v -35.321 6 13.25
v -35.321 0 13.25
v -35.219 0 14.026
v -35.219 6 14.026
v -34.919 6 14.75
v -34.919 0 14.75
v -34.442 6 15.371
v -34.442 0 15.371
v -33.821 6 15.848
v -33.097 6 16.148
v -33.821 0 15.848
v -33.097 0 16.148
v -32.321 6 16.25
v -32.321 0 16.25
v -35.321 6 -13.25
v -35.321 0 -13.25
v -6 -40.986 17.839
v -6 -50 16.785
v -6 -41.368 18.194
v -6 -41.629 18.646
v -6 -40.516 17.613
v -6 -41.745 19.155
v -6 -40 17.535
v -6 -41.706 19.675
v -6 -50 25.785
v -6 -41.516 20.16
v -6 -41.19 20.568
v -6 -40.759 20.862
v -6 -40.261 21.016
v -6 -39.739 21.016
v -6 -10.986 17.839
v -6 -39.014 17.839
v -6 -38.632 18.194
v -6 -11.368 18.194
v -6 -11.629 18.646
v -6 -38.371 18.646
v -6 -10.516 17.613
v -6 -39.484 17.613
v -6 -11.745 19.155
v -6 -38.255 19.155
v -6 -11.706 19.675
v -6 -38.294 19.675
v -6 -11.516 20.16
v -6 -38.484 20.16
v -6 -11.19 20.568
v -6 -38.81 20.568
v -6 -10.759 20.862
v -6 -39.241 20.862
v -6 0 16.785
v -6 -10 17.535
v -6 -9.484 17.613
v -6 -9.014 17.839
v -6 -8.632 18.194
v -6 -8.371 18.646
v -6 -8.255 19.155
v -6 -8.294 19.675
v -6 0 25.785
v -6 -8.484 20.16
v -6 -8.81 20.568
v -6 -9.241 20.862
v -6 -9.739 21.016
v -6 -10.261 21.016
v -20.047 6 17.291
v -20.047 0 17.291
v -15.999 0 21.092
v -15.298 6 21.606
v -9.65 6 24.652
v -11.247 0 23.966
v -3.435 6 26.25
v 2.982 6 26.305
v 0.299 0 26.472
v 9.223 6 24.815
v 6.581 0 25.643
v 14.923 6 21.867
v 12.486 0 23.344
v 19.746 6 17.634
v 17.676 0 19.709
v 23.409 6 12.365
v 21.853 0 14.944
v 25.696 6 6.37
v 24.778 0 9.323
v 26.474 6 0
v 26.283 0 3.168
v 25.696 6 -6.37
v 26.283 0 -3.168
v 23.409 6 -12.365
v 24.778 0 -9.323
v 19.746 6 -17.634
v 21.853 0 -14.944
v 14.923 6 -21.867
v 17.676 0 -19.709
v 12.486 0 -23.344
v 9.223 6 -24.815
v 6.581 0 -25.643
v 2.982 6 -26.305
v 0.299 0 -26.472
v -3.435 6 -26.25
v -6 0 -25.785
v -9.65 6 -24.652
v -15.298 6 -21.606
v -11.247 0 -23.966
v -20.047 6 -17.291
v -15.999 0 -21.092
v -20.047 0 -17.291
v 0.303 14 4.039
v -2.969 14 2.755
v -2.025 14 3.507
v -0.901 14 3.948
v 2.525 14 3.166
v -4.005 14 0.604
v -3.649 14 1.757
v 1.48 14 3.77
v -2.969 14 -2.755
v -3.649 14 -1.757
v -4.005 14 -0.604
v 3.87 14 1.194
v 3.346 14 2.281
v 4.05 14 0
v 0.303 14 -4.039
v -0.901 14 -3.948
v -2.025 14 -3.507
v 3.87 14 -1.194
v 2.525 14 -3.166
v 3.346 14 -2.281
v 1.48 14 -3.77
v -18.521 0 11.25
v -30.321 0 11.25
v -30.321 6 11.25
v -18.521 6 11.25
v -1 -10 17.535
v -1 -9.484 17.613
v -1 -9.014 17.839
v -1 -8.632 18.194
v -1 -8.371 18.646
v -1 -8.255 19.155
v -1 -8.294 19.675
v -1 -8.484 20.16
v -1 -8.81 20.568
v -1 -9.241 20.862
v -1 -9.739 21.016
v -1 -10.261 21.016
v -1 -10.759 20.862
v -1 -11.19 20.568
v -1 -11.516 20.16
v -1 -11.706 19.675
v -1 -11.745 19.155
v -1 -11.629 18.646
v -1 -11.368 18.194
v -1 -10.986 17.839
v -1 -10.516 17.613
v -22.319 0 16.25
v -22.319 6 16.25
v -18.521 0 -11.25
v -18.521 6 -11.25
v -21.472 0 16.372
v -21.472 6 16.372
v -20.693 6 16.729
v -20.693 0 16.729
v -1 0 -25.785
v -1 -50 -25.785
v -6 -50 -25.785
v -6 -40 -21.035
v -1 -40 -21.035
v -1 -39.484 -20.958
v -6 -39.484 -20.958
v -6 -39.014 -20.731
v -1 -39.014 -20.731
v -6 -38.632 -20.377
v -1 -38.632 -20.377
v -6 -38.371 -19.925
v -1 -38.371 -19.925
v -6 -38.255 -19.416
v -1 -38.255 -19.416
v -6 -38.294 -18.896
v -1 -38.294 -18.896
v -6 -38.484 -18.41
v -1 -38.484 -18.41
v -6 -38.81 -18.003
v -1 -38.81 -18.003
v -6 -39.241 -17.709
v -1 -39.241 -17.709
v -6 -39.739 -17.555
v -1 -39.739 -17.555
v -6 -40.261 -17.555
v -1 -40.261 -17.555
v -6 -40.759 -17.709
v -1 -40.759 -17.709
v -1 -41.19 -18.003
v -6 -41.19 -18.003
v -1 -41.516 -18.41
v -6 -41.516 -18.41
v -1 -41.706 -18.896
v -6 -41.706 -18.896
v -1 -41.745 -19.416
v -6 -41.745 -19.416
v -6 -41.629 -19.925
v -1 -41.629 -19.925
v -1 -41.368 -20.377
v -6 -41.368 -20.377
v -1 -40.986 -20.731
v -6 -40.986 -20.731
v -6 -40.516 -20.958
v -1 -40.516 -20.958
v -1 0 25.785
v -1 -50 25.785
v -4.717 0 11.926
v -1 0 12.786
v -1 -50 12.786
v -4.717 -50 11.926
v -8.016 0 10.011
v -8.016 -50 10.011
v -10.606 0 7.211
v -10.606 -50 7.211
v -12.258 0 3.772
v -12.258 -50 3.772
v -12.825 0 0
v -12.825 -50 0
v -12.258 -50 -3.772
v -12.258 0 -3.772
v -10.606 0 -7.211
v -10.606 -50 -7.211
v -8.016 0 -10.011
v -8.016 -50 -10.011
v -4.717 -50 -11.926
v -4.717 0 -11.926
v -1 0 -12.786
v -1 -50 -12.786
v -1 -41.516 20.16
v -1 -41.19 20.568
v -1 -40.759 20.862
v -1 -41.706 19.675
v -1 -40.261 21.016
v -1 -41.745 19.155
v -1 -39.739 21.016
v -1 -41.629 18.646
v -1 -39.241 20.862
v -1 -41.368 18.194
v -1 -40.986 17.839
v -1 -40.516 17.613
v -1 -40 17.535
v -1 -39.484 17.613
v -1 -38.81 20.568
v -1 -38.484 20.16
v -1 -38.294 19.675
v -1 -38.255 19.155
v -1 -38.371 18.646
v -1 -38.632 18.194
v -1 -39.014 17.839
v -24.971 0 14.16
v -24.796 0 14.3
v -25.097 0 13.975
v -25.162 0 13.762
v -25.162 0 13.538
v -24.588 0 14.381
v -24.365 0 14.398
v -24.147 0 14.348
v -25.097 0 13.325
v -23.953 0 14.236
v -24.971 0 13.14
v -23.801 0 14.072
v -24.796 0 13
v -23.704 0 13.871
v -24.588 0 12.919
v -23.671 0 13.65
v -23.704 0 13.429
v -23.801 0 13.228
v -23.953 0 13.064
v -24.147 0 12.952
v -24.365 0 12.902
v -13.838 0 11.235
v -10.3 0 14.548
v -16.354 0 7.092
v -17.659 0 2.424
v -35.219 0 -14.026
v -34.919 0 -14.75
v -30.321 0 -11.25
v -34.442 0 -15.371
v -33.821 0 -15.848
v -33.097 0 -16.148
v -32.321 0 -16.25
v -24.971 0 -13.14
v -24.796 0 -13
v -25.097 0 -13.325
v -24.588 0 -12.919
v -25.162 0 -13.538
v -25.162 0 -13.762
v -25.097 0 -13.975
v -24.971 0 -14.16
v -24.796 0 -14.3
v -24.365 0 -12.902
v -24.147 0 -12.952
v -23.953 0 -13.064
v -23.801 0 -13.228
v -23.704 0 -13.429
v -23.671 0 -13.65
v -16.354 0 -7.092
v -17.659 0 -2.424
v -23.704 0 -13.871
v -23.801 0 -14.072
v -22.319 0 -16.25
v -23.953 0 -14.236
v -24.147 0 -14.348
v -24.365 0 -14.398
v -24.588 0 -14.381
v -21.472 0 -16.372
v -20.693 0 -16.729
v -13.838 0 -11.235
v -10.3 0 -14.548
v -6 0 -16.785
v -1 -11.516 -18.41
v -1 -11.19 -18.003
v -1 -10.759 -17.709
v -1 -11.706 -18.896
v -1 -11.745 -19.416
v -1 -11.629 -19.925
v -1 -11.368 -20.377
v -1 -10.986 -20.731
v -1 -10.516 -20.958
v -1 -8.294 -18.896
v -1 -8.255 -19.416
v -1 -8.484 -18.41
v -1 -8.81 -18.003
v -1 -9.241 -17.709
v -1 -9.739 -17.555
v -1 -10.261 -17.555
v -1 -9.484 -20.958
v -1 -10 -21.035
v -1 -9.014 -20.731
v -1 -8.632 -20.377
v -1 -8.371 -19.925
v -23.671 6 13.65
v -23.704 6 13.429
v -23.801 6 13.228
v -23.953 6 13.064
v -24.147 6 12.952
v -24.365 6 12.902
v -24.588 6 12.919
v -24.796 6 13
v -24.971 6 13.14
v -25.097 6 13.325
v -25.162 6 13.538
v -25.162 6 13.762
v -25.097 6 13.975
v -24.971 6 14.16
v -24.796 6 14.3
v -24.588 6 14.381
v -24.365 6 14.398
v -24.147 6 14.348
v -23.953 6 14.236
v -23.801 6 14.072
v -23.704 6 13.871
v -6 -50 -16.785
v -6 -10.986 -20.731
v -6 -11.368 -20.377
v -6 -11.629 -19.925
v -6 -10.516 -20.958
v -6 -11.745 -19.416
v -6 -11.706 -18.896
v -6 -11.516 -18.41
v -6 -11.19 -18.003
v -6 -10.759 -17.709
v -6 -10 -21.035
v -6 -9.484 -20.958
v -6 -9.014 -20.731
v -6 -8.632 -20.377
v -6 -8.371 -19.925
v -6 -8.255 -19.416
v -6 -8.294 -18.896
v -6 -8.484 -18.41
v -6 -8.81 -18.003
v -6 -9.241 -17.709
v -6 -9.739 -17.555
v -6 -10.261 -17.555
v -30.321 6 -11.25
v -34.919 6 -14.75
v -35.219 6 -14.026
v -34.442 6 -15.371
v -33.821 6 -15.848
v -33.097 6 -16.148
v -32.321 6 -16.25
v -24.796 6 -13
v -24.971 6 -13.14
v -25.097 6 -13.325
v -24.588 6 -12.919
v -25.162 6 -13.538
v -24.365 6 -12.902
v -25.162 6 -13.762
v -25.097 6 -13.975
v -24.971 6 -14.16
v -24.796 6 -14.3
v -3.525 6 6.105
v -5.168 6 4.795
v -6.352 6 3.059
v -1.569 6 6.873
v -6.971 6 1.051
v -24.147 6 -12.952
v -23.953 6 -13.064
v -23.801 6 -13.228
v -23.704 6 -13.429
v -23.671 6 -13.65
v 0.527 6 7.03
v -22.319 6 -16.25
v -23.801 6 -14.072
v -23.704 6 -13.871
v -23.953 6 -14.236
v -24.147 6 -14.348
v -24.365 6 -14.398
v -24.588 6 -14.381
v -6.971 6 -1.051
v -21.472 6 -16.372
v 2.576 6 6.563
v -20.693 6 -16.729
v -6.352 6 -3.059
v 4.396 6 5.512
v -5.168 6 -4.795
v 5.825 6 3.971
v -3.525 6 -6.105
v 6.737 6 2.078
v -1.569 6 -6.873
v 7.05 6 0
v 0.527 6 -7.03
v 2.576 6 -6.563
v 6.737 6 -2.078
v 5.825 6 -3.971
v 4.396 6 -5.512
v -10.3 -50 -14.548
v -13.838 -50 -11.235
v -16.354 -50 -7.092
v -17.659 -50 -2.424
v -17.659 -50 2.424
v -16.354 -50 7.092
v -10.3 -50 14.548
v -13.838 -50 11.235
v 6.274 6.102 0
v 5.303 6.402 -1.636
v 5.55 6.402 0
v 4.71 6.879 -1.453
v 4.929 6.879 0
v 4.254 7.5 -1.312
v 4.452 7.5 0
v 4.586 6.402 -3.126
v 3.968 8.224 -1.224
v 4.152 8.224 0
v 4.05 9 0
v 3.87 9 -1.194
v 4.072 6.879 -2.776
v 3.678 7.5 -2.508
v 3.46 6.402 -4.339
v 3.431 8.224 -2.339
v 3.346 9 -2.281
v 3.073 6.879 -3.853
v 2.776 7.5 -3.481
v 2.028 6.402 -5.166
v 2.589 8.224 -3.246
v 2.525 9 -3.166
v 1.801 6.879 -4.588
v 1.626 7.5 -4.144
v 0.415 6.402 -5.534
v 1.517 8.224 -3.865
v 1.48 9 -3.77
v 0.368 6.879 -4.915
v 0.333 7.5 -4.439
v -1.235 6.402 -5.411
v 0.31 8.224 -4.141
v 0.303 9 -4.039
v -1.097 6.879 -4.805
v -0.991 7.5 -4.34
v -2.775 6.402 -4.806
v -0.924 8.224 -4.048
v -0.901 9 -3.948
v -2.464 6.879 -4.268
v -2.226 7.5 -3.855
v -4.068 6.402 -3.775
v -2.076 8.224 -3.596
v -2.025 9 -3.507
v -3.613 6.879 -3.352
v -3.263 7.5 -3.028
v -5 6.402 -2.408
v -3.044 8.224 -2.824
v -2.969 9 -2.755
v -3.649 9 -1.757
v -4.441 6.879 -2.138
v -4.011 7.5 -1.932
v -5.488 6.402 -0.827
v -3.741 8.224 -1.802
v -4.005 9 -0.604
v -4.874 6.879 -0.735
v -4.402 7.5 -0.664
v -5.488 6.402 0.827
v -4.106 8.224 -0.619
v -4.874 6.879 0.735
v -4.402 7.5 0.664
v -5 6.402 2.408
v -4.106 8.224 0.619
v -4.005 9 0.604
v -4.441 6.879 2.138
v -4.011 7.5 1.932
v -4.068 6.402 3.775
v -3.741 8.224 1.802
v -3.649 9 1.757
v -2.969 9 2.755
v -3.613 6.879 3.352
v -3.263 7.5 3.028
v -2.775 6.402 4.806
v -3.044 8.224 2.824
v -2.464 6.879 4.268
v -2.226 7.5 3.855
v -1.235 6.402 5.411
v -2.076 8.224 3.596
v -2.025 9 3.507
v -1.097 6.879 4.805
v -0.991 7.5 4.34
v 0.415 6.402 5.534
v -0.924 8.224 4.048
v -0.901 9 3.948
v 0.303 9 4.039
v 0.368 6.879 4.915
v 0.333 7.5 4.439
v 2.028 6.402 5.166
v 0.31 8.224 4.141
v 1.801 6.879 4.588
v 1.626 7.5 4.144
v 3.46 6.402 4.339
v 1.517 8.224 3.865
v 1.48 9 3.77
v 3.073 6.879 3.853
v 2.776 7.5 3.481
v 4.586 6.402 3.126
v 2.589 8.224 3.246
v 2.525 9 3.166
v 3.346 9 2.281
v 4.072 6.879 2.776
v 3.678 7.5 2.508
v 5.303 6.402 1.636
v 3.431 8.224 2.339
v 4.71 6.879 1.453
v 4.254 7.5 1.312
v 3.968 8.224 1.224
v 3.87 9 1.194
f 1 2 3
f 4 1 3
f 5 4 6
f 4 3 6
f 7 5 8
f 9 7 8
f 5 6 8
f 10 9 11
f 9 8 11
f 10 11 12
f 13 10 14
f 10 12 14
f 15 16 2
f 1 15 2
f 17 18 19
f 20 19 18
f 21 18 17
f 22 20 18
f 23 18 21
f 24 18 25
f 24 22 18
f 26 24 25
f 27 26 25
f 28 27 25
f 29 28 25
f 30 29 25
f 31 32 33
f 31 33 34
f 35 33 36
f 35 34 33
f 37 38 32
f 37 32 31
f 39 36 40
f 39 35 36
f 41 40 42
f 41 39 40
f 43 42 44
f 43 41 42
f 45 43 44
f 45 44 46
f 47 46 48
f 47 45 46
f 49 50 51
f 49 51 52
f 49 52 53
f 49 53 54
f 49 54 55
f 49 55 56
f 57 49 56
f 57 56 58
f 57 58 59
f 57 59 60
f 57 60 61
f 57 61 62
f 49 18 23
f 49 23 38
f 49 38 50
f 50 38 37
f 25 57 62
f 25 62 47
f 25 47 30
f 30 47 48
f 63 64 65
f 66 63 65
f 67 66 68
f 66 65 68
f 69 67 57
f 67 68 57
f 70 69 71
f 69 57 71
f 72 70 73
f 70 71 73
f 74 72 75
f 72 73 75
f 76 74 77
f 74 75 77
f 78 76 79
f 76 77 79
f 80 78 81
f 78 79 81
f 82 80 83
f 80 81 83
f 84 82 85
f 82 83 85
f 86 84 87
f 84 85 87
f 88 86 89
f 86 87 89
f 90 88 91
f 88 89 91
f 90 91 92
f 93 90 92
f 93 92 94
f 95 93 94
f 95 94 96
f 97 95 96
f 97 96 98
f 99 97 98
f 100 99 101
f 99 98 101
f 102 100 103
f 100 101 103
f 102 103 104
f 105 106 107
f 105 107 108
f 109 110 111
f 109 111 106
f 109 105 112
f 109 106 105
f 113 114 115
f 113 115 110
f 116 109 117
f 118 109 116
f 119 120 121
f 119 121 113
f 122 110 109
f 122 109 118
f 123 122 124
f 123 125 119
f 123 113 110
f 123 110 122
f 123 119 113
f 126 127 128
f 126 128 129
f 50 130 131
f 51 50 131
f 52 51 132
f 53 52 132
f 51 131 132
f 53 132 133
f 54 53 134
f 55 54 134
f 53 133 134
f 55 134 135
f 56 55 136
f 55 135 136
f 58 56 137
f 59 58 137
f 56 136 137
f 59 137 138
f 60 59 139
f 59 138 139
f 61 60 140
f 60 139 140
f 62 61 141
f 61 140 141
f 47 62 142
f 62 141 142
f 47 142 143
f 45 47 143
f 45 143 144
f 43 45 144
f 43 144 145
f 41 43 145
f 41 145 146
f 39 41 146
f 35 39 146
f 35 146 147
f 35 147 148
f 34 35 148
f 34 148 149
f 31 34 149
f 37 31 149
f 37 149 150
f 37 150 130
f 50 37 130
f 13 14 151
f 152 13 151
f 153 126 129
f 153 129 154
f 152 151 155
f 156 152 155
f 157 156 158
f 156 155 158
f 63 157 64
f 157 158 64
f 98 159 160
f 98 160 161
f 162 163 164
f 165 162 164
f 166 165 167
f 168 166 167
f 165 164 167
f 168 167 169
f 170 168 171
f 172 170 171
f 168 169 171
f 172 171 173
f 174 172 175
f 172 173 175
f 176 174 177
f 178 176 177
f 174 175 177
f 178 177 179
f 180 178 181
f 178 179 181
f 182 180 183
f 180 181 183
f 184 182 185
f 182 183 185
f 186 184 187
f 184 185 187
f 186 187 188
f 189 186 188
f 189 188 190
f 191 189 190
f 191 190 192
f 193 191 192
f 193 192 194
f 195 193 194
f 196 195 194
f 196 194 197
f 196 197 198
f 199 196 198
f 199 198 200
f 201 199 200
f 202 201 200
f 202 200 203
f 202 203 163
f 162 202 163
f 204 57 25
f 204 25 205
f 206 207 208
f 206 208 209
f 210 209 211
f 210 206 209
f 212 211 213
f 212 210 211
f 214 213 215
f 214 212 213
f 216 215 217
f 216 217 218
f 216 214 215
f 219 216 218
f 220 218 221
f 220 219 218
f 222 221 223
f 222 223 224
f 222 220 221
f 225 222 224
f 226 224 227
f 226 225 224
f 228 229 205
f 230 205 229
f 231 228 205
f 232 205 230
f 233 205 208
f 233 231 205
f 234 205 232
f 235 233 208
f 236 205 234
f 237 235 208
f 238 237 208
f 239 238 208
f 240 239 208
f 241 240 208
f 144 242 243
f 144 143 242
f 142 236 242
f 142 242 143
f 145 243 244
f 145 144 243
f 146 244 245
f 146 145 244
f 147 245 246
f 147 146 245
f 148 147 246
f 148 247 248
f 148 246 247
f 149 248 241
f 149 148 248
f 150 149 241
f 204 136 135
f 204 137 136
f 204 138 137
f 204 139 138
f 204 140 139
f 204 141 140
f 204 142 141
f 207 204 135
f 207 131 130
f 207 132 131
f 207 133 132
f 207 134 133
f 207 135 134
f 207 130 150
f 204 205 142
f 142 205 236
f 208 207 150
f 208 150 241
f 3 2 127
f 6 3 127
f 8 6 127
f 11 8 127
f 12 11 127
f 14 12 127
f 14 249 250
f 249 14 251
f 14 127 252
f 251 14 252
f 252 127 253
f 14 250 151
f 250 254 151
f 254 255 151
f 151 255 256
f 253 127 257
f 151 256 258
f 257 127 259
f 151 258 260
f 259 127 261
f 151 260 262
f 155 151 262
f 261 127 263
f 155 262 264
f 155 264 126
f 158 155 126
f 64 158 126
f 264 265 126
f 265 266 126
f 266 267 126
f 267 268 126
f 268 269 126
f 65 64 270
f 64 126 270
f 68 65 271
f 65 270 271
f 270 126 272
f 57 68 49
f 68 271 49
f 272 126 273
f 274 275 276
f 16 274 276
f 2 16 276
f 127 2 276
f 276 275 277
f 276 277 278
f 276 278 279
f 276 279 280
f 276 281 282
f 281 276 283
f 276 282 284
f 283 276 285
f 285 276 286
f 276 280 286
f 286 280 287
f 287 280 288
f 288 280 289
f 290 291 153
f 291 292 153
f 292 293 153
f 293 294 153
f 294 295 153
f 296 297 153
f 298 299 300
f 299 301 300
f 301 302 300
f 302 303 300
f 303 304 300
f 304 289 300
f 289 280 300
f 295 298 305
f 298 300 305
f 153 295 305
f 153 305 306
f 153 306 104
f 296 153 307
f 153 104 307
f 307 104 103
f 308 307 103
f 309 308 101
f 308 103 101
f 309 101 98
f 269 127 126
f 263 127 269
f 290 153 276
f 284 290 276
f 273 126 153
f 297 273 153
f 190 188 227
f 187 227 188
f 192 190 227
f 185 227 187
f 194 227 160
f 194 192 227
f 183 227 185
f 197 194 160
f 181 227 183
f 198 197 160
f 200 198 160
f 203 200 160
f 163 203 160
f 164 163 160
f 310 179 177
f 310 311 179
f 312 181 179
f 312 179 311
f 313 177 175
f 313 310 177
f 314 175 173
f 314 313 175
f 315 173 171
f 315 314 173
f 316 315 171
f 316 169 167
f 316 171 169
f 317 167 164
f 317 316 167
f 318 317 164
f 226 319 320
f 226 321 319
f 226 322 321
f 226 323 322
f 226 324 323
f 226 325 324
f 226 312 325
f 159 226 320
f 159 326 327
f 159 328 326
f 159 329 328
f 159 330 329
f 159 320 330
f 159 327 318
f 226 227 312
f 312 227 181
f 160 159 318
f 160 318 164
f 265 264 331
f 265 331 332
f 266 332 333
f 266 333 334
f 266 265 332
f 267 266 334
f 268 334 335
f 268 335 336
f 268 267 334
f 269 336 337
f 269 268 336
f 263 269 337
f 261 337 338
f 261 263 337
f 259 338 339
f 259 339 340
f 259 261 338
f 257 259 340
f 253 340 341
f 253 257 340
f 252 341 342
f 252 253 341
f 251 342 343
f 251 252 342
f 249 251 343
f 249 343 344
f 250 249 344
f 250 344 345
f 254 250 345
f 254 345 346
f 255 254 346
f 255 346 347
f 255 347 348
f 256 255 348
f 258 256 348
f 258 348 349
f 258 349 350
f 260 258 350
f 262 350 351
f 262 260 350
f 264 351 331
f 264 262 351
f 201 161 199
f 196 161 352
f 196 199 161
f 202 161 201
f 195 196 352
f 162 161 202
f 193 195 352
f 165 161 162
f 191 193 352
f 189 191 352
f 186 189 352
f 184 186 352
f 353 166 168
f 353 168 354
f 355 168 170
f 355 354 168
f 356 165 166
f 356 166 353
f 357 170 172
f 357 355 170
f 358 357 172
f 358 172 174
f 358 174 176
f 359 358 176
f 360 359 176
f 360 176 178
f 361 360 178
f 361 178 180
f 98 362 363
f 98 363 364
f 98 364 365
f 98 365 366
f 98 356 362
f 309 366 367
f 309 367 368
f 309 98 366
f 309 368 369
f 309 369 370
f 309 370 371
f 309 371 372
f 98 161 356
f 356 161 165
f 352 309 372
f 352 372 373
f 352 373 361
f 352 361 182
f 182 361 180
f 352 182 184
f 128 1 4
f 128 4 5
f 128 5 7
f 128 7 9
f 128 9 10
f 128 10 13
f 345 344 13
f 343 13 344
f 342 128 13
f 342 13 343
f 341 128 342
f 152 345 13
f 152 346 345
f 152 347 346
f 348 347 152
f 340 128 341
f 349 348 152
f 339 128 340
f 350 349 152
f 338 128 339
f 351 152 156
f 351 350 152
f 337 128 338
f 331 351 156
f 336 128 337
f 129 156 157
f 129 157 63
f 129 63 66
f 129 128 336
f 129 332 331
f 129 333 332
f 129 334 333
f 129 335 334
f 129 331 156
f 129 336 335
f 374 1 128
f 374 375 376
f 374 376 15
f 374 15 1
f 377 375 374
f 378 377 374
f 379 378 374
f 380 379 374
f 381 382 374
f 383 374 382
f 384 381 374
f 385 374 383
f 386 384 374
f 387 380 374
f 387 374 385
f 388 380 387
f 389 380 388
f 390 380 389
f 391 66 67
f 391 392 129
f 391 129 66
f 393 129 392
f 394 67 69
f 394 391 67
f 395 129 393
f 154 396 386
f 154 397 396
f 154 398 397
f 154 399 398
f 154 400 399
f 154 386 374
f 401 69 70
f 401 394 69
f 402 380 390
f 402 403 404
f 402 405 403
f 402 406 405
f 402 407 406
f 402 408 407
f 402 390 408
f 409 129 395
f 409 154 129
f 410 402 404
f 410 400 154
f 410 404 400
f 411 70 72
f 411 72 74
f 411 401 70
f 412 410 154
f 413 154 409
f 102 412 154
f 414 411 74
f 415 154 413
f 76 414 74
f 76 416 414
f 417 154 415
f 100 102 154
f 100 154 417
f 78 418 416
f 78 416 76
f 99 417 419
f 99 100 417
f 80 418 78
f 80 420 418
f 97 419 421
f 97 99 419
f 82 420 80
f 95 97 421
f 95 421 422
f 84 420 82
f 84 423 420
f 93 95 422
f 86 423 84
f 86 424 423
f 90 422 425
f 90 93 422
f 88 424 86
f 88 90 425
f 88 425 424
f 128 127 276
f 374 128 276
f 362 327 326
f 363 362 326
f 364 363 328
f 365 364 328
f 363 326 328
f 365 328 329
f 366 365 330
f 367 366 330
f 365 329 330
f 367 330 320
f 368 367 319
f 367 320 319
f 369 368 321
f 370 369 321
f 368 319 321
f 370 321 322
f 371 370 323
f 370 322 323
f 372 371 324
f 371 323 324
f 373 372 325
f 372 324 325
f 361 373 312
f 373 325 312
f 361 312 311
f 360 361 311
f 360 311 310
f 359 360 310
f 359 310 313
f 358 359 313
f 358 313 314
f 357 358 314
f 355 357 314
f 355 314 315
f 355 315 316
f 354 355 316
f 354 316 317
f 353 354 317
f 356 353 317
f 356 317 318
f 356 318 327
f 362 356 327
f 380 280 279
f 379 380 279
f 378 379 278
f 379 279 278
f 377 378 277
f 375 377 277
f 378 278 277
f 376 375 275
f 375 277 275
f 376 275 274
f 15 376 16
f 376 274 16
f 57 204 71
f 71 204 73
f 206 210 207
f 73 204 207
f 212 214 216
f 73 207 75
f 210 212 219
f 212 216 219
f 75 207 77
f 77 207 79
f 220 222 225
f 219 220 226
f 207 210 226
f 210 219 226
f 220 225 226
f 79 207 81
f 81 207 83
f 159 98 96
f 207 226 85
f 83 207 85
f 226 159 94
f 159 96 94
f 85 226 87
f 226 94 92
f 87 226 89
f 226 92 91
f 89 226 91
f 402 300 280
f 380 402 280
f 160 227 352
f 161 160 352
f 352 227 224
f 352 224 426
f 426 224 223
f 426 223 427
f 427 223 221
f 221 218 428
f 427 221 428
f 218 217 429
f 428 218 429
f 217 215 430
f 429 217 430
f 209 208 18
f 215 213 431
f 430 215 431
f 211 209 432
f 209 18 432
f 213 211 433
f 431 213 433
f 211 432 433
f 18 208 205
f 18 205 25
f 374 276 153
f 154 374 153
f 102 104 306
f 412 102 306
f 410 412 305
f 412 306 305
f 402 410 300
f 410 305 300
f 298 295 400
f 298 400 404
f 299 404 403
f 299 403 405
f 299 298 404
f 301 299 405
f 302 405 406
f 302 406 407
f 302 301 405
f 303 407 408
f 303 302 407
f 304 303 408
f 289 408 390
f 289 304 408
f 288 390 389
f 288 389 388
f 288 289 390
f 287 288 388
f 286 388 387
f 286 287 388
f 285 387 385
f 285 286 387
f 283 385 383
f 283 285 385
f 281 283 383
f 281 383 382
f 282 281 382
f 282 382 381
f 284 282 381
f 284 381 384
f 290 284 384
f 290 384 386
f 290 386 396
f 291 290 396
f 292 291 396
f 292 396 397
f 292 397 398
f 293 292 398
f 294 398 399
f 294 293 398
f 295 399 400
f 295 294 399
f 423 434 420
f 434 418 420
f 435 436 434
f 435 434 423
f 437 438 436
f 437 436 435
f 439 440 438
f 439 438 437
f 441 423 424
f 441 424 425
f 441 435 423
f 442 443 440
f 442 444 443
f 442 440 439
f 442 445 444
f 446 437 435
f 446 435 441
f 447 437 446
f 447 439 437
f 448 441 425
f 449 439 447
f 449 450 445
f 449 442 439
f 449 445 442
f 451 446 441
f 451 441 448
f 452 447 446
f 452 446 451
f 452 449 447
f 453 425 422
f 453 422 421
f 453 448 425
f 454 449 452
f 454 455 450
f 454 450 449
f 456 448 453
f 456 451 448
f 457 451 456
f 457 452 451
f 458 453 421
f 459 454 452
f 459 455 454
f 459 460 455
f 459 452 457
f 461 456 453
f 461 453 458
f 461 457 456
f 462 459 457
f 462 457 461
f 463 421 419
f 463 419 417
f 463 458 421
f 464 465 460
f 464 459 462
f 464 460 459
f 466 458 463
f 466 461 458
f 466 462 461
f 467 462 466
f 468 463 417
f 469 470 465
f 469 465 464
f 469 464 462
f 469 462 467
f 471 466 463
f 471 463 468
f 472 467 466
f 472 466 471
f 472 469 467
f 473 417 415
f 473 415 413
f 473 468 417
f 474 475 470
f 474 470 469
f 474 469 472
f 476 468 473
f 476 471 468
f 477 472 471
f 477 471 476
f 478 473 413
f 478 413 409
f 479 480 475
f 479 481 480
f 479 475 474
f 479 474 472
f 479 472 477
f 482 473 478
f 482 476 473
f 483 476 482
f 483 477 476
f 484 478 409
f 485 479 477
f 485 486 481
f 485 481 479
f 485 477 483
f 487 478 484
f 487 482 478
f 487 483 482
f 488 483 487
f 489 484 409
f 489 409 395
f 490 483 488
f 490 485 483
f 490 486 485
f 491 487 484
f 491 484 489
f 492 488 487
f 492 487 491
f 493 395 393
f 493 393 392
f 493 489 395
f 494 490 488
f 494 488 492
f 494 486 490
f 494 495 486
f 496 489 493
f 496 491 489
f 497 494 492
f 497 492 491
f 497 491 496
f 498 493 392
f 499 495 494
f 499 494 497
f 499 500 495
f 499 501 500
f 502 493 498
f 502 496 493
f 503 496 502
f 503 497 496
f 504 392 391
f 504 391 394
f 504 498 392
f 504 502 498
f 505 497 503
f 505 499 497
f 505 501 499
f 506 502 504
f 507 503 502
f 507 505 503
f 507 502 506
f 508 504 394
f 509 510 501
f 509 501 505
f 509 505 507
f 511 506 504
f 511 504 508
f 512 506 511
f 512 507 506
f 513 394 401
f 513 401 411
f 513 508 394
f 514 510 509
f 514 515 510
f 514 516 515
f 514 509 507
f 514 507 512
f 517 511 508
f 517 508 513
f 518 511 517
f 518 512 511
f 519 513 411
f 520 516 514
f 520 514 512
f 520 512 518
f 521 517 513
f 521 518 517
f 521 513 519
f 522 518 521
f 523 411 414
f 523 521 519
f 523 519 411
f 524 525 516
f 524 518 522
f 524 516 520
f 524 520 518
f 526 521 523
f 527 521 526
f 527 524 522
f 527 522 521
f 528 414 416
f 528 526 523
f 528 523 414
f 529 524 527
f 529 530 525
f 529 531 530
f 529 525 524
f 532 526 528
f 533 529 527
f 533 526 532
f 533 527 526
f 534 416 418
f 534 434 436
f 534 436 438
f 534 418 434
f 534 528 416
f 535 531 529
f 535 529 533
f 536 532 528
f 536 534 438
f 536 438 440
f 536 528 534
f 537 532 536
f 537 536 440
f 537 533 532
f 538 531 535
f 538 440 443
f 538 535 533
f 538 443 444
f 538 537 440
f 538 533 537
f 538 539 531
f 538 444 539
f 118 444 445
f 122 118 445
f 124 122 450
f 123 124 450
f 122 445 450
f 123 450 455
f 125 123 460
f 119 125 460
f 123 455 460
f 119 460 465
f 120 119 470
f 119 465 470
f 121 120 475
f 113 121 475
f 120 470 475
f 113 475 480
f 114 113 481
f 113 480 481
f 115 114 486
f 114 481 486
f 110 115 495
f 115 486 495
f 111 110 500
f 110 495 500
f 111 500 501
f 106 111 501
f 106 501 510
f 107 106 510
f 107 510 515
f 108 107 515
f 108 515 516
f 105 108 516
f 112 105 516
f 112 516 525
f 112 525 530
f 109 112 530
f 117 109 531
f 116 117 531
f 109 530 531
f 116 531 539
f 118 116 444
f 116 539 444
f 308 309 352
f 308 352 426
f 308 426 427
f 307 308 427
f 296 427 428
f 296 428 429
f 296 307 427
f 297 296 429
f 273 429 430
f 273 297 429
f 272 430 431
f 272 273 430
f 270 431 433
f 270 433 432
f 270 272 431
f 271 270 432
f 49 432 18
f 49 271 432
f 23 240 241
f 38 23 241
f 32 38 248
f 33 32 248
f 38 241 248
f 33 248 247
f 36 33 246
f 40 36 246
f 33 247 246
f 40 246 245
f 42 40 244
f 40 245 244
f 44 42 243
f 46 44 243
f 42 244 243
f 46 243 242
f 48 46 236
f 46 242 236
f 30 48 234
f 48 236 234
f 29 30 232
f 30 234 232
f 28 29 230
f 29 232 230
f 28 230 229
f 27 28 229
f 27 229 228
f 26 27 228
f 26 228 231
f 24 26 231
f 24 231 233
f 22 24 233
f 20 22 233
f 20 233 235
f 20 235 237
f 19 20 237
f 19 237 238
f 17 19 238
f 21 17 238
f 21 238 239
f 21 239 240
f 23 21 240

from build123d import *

# Parameters (mm, degrees)
BOSS_EXTRUDE4_DEPTH = 50
SKETCH7_R           = 1.75
CUT_EXTRUDE1_DEPTH  = 17.825
SKETCH8_R           = 0.75
SKETCH8_W           = 11.8
SKETCH8_H           = 22.5
BOSS_EXTRUDE5_DEPTH = 6
SKETCH9_R           = 4.05
BOSS_EXTRUDE6_DEPTH = 8
FILLET1_R           = 3


with BuildPart() as part:
    # Sketch6 → Boss-Extrude4 (new body)
    with BuildSketch(Plane.XZ):
        with BuildLine():
            Line((-1, 25.784833184), (-1, 12.785954208))
            ThreePointArc((-1, 12.785954208), (-12.825, 0), (-1, -12.785954208))
            Line((-1, -12.785954208), (-1, -25.784833184))
            Line((-1, -25.784833184), (-6, -25.784833184))
            Line((-6, -25.784833184), (-6, -16.784833184))
            ThreePointArc((-6, -16.784833184), (-17.825, 0), (-6, 16.784833184))
            Line((-6, 16.784833184), (-6, 25.784833184))
            Line((-6, 25.784833184), (-1, 25.784833184))
        make_face()
    extrude(amount=BOSS_EXTRUDE4_DEPTH)

    # Sketch7 → Cut-Extrude1 (cut, through all)
    with BuildSketch(Plane(origin=(-1, 0, 0), x_dir=(0, 0, -1), z_dir=(1, 0, 0))):
        with Locations((-19.285393696, -10)):
            Circle(SKETCH7_R)
        with Locations((-19.285393696, -40)):
            Circle(SKETCH7_R)
        with Locations((19.285393696, -40)):
            Circle(SKETCH7_R)
        with Locations((19.285393696, -10)):
            Circle(SKETCH7_R)
    extrude(amount=-CUT_EXTRUDE1_DEPTH, mode=Mode.SUBTRACT)

    # Sketch8 → Boss-Extrude5 (add)
    with BuildSketch(Plane(origin=(0, 0, 0), x_dir=(1, 0, 0), z_dir=(0, 1, 0))):
        with BuildLine():
            Line((-32.320841509, -16.25), (-22.318992281, -16.25))
            ThreePointArc((-22.318992281, -16.25), (-21.069616181, -16.522536094), (-20.047240136, -17.290627093))
            ThreePointArc((-20.047240136, -17.290627093), (26.473715688, 0), (-20.047240136, 17.290627093))
            ThreePointArc((-20.047240136, 17.290627093), (-21.069616181, 16.522536094), (-22.318992281, 16.25))
            Line((-22.318992281, 16.25), (-32.320841509, 16.25))
            ThreePointArc((-32.320841509, 16.25), (-34.442161852, 15.371320344), (-35.320841509, 13.25))
            Line((-35.320841509, 13.25), (-35.320841509, -13.25))
            ThreePointArc((-35.320841509, -13.25), (-34.442161852, -15.371320344), (-32.320841509, -16.25))
        make_face()
        with Locations((-24.420841509, 13.65)):
            Circle(SKETCH8_R, mode=Mode.SUBTRACT)
        with Locations((-24.420841509, -13.65)):
            Circle(SKETCH8_R, mode=Mode.SUBTRACT)
        with Locations((-24.420841509, 0)):
            Rectangle(SKETCH8_W, SKETCH8_H, mode=Mode.SUBTRACT)
    extrude(amount=BOSS_EXTRUDE5_DEPTH)

    # Sketch9 → Boss-Extrude6 (add)
    with BuildSketch(Plane(origin=(0, 6, 0), x_dir=(1, 0, 0), z_dir=(0, 1, 0))):
        Circle(SKETCH9_R)
    extrude(amount=BOSS_EXTRUDE6_DEPTH)

    # Fillet1
    fillet1_edges = [part.edges().sort_by_distance(p)[0] for p in [
        (-4.05, 6, 0),
    ]]
    fillet(fillet1_edges, radius=FILLET1_R)


solid = part.part
